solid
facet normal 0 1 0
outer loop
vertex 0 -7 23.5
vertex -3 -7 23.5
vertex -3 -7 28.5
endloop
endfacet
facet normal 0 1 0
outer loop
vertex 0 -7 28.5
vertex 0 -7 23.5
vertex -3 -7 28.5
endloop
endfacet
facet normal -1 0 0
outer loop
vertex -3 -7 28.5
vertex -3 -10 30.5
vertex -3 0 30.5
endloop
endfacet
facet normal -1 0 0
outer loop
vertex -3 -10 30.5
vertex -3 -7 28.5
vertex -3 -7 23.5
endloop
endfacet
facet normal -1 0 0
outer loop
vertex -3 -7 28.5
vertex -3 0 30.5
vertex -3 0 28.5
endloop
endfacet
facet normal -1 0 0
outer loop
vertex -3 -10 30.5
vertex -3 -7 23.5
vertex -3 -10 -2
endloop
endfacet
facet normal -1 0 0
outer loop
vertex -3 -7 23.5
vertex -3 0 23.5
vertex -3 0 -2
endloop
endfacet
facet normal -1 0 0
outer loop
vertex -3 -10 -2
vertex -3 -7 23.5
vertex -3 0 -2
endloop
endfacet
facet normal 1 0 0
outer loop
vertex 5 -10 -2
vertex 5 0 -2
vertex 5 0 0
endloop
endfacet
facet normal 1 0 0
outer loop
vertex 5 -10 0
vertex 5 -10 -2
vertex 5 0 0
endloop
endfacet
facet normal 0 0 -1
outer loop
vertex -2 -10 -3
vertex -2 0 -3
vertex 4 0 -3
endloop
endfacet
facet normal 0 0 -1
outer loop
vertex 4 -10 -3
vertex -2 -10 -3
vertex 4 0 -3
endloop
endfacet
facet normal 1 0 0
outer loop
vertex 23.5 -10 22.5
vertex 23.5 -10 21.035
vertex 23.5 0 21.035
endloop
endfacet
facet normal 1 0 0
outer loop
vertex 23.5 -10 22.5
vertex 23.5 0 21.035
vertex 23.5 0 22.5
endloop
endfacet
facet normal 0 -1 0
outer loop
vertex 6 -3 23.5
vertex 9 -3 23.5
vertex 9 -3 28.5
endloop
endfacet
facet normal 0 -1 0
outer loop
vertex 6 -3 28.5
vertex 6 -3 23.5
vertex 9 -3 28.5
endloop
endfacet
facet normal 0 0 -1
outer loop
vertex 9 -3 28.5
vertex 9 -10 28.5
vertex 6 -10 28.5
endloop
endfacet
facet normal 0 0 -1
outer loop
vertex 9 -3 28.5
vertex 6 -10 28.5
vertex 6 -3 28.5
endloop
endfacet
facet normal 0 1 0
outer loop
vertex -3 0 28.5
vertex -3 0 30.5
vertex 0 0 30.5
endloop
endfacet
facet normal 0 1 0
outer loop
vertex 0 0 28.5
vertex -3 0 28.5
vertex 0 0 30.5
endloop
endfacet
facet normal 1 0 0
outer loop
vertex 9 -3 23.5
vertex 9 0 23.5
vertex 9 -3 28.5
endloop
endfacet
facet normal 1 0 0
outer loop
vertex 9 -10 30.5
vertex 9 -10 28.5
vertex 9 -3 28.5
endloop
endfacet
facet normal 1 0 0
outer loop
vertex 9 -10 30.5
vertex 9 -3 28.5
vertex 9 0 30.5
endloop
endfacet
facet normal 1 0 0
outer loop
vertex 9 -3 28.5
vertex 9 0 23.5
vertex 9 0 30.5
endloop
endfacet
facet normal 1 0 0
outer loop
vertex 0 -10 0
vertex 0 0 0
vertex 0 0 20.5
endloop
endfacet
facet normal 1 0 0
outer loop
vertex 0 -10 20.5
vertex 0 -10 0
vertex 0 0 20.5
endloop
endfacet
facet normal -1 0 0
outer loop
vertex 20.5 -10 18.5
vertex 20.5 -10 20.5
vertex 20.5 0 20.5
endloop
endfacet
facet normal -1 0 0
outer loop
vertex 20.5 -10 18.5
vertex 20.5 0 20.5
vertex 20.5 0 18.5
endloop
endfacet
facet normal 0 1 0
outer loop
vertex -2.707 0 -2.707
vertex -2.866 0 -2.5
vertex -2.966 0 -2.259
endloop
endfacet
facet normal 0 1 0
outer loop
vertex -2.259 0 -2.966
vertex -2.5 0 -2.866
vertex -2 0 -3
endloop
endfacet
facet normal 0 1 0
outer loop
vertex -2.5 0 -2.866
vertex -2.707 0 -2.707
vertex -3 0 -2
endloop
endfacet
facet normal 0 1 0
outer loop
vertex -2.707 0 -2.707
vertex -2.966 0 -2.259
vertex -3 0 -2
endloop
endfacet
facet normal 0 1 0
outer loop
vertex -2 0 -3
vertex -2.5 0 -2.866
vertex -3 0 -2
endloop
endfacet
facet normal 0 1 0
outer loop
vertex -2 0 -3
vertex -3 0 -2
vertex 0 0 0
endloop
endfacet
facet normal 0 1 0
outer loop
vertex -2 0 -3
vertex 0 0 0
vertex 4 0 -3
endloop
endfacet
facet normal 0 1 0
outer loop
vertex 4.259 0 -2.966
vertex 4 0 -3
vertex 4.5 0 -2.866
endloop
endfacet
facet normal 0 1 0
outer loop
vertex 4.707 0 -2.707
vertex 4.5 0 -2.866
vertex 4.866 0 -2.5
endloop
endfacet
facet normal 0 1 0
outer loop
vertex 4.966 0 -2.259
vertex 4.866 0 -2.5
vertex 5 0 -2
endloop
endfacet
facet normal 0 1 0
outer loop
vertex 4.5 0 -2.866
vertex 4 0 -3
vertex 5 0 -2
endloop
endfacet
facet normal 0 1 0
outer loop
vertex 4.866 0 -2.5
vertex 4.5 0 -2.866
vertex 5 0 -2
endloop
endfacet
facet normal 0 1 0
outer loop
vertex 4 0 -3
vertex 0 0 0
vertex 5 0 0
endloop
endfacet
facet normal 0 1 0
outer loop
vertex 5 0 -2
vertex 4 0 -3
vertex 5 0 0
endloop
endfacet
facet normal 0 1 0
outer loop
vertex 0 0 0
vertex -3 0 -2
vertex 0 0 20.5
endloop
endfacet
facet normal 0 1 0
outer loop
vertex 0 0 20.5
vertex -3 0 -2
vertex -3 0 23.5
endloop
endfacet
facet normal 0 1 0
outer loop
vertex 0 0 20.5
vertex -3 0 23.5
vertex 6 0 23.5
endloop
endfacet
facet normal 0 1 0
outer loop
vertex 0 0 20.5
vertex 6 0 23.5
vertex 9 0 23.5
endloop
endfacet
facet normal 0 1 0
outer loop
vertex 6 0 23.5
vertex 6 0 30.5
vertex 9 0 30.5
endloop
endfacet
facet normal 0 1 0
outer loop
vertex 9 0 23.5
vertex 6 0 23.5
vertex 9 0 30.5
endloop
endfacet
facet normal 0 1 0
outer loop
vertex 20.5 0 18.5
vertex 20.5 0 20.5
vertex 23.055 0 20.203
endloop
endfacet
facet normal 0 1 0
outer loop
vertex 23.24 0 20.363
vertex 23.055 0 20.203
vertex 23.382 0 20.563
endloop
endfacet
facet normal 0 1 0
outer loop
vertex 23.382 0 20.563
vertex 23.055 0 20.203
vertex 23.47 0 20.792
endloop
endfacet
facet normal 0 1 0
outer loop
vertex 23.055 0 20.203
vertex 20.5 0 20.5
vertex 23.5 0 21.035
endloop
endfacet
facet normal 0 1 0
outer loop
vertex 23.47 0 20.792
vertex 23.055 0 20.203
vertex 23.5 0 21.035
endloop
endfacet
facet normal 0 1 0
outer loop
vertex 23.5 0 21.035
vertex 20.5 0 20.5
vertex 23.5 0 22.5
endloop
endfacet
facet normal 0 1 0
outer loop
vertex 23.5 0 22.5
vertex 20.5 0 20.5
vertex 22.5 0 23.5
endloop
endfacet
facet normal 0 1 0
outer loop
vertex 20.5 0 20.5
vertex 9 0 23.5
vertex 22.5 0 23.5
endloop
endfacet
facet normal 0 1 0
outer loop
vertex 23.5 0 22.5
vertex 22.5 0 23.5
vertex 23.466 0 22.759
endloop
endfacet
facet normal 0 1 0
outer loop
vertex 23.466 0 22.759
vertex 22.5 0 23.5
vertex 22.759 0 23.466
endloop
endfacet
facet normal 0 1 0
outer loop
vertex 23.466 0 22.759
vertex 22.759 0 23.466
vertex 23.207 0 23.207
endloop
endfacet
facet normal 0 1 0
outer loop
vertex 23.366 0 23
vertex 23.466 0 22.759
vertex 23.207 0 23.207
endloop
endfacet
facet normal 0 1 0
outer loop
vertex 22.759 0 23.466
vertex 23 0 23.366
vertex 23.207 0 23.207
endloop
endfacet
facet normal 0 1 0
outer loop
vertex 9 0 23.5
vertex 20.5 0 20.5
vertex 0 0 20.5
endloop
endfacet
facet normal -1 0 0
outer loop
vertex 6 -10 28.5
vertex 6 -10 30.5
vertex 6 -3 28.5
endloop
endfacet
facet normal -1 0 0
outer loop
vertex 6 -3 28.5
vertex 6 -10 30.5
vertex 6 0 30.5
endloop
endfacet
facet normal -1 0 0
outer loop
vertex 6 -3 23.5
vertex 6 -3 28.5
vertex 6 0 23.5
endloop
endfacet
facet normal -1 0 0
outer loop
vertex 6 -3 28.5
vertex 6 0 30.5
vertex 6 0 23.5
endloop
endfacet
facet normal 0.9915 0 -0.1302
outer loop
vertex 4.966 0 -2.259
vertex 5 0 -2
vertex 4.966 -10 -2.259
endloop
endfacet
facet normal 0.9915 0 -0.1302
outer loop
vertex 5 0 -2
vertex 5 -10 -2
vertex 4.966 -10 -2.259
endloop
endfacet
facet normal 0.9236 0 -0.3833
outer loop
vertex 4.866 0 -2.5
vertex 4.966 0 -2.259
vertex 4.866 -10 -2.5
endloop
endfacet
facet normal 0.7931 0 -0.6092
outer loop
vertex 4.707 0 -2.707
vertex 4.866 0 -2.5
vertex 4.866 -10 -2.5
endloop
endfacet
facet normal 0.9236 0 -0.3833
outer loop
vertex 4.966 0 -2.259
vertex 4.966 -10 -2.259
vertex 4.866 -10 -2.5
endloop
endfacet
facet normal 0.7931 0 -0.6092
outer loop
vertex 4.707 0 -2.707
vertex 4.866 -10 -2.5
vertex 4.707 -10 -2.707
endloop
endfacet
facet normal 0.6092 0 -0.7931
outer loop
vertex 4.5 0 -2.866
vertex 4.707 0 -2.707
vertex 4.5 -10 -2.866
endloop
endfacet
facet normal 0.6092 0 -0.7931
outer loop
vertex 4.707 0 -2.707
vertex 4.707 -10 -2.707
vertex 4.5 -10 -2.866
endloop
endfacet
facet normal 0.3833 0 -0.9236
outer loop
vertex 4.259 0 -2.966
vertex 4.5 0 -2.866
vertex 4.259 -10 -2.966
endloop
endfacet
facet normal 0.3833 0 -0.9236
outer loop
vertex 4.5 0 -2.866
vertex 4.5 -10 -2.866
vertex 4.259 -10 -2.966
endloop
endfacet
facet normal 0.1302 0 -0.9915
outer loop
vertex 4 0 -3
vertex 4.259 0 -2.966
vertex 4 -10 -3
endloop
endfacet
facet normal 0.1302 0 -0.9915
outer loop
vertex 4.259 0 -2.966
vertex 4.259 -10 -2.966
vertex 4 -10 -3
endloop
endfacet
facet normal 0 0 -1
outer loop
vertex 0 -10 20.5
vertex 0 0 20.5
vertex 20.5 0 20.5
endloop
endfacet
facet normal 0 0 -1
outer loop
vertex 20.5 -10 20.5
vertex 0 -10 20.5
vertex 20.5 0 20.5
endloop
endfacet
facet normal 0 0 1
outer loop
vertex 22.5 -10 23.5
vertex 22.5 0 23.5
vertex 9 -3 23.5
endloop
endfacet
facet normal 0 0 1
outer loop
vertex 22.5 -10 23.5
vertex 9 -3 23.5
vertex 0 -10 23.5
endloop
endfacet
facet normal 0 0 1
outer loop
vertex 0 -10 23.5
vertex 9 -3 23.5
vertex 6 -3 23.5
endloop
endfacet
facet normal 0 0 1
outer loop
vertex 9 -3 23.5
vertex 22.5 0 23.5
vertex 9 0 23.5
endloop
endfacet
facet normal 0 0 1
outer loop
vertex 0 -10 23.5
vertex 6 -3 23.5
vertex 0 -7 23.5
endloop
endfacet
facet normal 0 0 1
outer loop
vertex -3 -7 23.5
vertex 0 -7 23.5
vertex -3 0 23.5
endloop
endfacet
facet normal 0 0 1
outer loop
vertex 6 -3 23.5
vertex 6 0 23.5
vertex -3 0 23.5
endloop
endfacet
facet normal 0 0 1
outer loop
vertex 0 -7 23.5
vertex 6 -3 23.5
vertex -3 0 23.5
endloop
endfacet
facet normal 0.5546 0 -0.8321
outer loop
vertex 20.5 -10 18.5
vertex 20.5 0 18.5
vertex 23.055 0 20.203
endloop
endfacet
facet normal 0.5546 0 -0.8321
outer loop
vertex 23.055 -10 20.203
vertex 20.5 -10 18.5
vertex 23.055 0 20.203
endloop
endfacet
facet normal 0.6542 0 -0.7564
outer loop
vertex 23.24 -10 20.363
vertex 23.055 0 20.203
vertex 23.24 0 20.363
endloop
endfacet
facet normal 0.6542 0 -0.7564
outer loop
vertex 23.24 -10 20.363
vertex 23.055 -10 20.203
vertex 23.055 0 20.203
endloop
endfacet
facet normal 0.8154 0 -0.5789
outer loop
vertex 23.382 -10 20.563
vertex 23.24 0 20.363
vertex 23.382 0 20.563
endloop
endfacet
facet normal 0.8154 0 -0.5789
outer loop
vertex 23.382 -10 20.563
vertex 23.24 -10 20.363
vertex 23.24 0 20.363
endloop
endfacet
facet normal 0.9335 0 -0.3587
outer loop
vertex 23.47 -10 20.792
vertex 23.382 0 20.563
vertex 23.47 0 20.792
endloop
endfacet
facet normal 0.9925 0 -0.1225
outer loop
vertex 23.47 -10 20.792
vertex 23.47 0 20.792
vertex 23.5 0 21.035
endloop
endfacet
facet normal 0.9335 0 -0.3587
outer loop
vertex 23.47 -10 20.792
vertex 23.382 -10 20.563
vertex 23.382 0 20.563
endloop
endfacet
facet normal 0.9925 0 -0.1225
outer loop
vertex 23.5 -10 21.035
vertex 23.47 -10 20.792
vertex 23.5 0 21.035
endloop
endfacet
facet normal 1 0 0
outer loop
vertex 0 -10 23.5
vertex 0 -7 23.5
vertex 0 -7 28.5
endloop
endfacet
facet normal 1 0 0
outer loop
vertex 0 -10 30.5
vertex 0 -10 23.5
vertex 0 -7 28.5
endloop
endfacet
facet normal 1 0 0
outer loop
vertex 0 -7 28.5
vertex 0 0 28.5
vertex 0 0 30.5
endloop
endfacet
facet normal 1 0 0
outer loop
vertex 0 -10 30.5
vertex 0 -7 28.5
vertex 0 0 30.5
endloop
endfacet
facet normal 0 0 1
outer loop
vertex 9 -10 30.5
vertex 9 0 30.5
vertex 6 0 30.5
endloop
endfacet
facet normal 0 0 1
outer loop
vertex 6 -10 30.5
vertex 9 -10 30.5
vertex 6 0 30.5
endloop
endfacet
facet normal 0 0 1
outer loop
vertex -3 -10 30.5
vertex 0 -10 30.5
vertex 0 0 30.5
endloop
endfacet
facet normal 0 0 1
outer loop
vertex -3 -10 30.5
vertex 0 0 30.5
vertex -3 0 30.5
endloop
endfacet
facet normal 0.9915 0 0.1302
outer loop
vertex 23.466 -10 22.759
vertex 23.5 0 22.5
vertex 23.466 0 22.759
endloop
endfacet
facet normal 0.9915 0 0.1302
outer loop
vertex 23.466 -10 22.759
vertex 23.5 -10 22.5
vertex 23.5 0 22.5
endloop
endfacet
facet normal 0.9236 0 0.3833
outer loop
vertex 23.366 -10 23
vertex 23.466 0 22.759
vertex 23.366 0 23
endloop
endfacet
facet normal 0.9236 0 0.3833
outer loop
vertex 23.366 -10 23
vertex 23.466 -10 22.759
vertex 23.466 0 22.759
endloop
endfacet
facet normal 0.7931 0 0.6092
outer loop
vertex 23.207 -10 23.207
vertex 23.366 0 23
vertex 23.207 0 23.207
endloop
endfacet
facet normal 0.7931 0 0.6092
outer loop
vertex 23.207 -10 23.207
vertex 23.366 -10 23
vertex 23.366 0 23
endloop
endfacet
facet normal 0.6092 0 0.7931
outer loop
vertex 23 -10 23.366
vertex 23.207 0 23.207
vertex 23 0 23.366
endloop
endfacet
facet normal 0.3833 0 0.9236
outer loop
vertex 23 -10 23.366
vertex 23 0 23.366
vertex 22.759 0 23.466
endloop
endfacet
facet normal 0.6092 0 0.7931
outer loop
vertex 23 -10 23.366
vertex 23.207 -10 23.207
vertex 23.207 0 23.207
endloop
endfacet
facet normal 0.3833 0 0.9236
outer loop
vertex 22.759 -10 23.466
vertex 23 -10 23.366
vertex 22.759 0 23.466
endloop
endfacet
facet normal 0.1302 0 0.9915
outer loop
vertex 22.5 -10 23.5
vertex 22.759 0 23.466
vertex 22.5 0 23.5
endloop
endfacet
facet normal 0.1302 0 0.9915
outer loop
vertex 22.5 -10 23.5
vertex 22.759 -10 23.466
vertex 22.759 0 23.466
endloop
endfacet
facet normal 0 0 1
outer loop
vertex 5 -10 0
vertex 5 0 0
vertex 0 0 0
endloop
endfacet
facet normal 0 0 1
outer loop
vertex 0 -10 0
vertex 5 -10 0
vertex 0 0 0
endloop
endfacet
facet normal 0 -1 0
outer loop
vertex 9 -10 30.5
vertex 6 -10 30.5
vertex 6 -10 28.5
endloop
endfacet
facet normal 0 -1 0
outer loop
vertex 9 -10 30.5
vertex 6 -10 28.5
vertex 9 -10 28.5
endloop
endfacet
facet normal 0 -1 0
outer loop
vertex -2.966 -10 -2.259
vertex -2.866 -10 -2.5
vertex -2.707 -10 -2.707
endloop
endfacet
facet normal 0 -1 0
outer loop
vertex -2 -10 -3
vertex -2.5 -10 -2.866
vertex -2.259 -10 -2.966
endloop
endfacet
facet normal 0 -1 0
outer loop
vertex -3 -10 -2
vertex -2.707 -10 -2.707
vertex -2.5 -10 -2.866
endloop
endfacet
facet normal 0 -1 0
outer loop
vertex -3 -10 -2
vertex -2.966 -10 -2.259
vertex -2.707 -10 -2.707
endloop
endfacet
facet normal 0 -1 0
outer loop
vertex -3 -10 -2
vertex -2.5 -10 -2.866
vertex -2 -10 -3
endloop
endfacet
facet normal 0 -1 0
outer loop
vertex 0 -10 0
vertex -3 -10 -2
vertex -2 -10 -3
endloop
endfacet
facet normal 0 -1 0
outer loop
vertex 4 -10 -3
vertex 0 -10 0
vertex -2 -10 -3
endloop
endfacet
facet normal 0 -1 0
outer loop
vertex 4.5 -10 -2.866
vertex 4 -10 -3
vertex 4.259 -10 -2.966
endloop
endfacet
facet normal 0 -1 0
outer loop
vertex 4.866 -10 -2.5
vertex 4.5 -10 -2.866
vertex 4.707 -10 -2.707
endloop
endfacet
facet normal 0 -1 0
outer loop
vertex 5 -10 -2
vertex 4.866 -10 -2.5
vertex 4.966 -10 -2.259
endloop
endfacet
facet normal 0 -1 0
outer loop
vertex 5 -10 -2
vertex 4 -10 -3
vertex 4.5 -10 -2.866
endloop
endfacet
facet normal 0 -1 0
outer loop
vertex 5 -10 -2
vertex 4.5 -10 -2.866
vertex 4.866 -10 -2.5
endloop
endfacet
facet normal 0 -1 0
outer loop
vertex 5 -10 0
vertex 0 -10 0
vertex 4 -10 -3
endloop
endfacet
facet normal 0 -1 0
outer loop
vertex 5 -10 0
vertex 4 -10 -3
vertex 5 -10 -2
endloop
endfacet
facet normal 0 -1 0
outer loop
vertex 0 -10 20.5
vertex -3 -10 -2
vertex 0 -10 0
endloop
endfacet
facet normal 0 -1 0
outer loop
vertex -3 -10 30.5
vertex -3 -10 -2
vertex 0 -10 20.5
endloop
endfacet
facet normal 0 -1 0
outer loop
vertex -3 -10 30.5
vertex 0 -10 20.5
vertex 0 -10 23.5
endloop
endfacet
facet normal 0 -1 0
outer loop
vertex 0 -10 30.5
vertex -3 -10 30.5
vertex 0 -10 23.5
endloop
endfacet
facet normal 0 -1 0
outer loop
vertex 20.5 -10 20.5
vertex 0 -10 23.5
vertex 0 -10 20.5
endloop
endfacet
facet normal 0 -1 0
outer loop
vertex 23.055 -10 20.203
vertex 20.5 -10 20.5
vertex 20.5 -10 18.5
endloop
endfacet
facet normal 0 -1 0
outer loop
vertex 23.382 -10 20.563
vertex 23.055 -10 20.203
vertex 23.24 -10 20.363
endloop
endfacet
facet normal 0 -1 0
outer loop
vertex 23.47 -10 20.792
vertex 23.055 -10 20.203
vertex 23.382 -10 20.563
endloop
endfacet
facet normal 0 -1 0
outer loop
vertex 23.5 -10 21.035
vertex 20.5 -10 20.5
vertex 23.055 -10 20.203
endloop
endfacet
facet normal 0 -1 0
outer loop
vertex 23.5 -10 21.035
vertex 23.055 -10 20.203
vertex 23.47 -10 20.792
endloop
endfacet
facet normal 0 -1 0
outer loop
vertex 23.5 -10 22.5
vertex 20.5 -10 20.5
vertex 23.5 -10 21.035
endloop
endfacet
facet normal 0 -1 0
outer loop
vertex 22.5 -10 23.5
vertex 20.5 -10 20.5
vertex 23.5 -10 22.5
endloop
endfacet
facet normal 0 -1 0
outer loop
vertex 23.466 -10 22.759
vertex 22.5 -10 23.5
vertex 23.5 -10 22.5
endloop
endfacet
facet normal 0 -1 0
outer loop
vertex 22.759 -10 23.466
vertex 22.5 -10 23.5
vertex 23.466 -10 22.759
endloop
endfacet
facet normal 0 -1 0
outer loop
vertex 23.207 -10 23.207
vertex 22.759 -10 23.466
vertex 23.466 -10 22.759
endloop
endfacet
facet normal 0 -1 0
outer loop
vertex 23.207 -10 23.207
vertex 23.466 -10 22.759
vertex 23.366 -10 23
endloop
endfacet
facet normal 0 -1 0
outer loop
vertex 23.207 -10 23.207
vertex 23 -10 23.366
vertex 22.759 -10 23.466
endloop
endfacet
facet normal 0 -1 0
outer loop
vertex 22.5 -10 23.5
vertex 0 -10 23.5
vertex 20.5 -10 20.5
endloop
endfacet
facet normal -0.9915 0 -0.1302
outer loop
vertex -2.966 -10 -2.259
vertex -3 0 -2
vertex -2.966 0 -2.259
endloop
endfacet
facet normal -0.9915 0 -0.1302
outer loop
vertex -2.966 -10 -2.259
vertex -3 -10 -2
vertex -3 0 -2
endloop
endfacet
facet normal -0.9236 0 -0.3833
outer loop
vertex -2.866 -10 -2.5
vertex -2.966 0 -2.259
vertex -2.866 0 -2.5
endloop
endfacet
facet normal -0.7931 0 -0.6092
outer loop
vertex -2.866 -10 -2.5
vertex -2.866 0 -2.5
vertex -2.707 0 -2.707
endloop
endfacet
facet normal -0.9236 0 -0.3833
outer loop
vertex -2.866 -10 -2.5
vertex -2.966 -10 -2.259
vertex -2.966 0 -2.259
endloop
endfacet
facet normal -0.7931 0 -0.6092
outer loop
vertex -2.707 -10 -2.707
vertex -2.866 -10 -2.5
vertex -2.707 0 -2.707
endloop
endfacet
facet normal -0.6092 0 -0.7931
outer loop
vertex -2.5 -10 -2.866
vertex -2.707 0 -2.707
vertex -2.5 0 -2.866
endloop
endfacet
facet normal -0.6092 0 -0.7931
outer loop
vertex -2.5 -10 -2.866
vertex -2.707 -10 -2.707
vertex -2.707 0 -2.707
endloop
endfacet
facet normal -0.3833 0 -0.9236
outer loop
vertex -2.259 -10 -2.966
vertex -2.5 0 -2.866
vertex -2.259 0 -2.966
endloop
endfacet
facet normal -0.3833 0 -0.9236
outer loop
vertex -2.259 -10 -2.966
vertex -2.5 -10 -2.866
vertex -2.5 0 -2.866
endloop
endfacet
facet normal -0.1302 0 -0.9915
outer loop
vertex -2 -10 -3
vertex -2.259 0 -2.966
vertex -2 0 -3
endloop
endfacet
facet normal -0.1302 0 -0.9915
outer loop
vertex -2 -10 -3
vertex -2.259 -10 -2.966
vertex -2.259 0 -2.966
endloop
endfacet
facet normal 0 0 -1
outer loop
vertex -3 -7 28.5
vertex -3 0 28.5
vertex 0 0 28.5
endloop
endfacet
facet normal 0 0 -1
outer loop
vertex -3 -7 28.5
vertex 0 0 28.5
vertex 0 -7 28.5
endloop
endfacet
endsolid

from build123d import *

# Parameters (mm, degrees)
F1_DEPTH = 10
F2_R     = 1
F3_W     = 7
F3_H     = 5
F4_DEPTH = 3
F5_W     = 7
F5_H     = 5
F6_DEPTH = 3


with BuildPart() as f1:
    # F0 (on Front) → F1 (new body)
    with BuildSketch(Plane.XZ):
        Polygon((5, -3), (5, 0), (0, 0), (0, 20.5), (20.5, 20.5), (20.5, 18.5), (23.5, 20.5), (23.5, 23.5), (9, 23.5), (9, 30.5), (6, 30.5), (6, 23.5), (0, 23.5), (0, 30.5), (-3, 30.5), (-3, 23.5), (-3, -3), align=None)
    extrude(amount=F1_DEPTH)

    # F2
    f2_edges = [f1.edges().sort_by_distance(p)[0] for p in [
        (23.5, -5, 23.5),
        (-3, -5, -3),
        (23.5, -5, 20.5),
        (5, -5, -3),
    ]]
    fillet(f2_edges, radius=F2_R)

    # F3 (on face) → F4 (cut, through all)
    with BuildSketch(Plane(origin=(-3, 0, 0), x_dir=(0, -1, 0), z_dir=(-1, 0, 0))):
        with Locations((3.5, 26)):
            Rectangle(F3_W, F3_H)
    extrude(amount=-F4_DEPTH, mode=Mode.SUBTRACT)

    # F5 (on face) → F6 (cut, through all)
    with BuildSketch(Plane.YZ.offset(9)):
        with Locations((-6.5, 26)):
            Rectangle(F5_W, F5_H)
    extrude(amount=-F6_DEPTH, mode=Mode.SUBTRACT)


solid = f1.part
